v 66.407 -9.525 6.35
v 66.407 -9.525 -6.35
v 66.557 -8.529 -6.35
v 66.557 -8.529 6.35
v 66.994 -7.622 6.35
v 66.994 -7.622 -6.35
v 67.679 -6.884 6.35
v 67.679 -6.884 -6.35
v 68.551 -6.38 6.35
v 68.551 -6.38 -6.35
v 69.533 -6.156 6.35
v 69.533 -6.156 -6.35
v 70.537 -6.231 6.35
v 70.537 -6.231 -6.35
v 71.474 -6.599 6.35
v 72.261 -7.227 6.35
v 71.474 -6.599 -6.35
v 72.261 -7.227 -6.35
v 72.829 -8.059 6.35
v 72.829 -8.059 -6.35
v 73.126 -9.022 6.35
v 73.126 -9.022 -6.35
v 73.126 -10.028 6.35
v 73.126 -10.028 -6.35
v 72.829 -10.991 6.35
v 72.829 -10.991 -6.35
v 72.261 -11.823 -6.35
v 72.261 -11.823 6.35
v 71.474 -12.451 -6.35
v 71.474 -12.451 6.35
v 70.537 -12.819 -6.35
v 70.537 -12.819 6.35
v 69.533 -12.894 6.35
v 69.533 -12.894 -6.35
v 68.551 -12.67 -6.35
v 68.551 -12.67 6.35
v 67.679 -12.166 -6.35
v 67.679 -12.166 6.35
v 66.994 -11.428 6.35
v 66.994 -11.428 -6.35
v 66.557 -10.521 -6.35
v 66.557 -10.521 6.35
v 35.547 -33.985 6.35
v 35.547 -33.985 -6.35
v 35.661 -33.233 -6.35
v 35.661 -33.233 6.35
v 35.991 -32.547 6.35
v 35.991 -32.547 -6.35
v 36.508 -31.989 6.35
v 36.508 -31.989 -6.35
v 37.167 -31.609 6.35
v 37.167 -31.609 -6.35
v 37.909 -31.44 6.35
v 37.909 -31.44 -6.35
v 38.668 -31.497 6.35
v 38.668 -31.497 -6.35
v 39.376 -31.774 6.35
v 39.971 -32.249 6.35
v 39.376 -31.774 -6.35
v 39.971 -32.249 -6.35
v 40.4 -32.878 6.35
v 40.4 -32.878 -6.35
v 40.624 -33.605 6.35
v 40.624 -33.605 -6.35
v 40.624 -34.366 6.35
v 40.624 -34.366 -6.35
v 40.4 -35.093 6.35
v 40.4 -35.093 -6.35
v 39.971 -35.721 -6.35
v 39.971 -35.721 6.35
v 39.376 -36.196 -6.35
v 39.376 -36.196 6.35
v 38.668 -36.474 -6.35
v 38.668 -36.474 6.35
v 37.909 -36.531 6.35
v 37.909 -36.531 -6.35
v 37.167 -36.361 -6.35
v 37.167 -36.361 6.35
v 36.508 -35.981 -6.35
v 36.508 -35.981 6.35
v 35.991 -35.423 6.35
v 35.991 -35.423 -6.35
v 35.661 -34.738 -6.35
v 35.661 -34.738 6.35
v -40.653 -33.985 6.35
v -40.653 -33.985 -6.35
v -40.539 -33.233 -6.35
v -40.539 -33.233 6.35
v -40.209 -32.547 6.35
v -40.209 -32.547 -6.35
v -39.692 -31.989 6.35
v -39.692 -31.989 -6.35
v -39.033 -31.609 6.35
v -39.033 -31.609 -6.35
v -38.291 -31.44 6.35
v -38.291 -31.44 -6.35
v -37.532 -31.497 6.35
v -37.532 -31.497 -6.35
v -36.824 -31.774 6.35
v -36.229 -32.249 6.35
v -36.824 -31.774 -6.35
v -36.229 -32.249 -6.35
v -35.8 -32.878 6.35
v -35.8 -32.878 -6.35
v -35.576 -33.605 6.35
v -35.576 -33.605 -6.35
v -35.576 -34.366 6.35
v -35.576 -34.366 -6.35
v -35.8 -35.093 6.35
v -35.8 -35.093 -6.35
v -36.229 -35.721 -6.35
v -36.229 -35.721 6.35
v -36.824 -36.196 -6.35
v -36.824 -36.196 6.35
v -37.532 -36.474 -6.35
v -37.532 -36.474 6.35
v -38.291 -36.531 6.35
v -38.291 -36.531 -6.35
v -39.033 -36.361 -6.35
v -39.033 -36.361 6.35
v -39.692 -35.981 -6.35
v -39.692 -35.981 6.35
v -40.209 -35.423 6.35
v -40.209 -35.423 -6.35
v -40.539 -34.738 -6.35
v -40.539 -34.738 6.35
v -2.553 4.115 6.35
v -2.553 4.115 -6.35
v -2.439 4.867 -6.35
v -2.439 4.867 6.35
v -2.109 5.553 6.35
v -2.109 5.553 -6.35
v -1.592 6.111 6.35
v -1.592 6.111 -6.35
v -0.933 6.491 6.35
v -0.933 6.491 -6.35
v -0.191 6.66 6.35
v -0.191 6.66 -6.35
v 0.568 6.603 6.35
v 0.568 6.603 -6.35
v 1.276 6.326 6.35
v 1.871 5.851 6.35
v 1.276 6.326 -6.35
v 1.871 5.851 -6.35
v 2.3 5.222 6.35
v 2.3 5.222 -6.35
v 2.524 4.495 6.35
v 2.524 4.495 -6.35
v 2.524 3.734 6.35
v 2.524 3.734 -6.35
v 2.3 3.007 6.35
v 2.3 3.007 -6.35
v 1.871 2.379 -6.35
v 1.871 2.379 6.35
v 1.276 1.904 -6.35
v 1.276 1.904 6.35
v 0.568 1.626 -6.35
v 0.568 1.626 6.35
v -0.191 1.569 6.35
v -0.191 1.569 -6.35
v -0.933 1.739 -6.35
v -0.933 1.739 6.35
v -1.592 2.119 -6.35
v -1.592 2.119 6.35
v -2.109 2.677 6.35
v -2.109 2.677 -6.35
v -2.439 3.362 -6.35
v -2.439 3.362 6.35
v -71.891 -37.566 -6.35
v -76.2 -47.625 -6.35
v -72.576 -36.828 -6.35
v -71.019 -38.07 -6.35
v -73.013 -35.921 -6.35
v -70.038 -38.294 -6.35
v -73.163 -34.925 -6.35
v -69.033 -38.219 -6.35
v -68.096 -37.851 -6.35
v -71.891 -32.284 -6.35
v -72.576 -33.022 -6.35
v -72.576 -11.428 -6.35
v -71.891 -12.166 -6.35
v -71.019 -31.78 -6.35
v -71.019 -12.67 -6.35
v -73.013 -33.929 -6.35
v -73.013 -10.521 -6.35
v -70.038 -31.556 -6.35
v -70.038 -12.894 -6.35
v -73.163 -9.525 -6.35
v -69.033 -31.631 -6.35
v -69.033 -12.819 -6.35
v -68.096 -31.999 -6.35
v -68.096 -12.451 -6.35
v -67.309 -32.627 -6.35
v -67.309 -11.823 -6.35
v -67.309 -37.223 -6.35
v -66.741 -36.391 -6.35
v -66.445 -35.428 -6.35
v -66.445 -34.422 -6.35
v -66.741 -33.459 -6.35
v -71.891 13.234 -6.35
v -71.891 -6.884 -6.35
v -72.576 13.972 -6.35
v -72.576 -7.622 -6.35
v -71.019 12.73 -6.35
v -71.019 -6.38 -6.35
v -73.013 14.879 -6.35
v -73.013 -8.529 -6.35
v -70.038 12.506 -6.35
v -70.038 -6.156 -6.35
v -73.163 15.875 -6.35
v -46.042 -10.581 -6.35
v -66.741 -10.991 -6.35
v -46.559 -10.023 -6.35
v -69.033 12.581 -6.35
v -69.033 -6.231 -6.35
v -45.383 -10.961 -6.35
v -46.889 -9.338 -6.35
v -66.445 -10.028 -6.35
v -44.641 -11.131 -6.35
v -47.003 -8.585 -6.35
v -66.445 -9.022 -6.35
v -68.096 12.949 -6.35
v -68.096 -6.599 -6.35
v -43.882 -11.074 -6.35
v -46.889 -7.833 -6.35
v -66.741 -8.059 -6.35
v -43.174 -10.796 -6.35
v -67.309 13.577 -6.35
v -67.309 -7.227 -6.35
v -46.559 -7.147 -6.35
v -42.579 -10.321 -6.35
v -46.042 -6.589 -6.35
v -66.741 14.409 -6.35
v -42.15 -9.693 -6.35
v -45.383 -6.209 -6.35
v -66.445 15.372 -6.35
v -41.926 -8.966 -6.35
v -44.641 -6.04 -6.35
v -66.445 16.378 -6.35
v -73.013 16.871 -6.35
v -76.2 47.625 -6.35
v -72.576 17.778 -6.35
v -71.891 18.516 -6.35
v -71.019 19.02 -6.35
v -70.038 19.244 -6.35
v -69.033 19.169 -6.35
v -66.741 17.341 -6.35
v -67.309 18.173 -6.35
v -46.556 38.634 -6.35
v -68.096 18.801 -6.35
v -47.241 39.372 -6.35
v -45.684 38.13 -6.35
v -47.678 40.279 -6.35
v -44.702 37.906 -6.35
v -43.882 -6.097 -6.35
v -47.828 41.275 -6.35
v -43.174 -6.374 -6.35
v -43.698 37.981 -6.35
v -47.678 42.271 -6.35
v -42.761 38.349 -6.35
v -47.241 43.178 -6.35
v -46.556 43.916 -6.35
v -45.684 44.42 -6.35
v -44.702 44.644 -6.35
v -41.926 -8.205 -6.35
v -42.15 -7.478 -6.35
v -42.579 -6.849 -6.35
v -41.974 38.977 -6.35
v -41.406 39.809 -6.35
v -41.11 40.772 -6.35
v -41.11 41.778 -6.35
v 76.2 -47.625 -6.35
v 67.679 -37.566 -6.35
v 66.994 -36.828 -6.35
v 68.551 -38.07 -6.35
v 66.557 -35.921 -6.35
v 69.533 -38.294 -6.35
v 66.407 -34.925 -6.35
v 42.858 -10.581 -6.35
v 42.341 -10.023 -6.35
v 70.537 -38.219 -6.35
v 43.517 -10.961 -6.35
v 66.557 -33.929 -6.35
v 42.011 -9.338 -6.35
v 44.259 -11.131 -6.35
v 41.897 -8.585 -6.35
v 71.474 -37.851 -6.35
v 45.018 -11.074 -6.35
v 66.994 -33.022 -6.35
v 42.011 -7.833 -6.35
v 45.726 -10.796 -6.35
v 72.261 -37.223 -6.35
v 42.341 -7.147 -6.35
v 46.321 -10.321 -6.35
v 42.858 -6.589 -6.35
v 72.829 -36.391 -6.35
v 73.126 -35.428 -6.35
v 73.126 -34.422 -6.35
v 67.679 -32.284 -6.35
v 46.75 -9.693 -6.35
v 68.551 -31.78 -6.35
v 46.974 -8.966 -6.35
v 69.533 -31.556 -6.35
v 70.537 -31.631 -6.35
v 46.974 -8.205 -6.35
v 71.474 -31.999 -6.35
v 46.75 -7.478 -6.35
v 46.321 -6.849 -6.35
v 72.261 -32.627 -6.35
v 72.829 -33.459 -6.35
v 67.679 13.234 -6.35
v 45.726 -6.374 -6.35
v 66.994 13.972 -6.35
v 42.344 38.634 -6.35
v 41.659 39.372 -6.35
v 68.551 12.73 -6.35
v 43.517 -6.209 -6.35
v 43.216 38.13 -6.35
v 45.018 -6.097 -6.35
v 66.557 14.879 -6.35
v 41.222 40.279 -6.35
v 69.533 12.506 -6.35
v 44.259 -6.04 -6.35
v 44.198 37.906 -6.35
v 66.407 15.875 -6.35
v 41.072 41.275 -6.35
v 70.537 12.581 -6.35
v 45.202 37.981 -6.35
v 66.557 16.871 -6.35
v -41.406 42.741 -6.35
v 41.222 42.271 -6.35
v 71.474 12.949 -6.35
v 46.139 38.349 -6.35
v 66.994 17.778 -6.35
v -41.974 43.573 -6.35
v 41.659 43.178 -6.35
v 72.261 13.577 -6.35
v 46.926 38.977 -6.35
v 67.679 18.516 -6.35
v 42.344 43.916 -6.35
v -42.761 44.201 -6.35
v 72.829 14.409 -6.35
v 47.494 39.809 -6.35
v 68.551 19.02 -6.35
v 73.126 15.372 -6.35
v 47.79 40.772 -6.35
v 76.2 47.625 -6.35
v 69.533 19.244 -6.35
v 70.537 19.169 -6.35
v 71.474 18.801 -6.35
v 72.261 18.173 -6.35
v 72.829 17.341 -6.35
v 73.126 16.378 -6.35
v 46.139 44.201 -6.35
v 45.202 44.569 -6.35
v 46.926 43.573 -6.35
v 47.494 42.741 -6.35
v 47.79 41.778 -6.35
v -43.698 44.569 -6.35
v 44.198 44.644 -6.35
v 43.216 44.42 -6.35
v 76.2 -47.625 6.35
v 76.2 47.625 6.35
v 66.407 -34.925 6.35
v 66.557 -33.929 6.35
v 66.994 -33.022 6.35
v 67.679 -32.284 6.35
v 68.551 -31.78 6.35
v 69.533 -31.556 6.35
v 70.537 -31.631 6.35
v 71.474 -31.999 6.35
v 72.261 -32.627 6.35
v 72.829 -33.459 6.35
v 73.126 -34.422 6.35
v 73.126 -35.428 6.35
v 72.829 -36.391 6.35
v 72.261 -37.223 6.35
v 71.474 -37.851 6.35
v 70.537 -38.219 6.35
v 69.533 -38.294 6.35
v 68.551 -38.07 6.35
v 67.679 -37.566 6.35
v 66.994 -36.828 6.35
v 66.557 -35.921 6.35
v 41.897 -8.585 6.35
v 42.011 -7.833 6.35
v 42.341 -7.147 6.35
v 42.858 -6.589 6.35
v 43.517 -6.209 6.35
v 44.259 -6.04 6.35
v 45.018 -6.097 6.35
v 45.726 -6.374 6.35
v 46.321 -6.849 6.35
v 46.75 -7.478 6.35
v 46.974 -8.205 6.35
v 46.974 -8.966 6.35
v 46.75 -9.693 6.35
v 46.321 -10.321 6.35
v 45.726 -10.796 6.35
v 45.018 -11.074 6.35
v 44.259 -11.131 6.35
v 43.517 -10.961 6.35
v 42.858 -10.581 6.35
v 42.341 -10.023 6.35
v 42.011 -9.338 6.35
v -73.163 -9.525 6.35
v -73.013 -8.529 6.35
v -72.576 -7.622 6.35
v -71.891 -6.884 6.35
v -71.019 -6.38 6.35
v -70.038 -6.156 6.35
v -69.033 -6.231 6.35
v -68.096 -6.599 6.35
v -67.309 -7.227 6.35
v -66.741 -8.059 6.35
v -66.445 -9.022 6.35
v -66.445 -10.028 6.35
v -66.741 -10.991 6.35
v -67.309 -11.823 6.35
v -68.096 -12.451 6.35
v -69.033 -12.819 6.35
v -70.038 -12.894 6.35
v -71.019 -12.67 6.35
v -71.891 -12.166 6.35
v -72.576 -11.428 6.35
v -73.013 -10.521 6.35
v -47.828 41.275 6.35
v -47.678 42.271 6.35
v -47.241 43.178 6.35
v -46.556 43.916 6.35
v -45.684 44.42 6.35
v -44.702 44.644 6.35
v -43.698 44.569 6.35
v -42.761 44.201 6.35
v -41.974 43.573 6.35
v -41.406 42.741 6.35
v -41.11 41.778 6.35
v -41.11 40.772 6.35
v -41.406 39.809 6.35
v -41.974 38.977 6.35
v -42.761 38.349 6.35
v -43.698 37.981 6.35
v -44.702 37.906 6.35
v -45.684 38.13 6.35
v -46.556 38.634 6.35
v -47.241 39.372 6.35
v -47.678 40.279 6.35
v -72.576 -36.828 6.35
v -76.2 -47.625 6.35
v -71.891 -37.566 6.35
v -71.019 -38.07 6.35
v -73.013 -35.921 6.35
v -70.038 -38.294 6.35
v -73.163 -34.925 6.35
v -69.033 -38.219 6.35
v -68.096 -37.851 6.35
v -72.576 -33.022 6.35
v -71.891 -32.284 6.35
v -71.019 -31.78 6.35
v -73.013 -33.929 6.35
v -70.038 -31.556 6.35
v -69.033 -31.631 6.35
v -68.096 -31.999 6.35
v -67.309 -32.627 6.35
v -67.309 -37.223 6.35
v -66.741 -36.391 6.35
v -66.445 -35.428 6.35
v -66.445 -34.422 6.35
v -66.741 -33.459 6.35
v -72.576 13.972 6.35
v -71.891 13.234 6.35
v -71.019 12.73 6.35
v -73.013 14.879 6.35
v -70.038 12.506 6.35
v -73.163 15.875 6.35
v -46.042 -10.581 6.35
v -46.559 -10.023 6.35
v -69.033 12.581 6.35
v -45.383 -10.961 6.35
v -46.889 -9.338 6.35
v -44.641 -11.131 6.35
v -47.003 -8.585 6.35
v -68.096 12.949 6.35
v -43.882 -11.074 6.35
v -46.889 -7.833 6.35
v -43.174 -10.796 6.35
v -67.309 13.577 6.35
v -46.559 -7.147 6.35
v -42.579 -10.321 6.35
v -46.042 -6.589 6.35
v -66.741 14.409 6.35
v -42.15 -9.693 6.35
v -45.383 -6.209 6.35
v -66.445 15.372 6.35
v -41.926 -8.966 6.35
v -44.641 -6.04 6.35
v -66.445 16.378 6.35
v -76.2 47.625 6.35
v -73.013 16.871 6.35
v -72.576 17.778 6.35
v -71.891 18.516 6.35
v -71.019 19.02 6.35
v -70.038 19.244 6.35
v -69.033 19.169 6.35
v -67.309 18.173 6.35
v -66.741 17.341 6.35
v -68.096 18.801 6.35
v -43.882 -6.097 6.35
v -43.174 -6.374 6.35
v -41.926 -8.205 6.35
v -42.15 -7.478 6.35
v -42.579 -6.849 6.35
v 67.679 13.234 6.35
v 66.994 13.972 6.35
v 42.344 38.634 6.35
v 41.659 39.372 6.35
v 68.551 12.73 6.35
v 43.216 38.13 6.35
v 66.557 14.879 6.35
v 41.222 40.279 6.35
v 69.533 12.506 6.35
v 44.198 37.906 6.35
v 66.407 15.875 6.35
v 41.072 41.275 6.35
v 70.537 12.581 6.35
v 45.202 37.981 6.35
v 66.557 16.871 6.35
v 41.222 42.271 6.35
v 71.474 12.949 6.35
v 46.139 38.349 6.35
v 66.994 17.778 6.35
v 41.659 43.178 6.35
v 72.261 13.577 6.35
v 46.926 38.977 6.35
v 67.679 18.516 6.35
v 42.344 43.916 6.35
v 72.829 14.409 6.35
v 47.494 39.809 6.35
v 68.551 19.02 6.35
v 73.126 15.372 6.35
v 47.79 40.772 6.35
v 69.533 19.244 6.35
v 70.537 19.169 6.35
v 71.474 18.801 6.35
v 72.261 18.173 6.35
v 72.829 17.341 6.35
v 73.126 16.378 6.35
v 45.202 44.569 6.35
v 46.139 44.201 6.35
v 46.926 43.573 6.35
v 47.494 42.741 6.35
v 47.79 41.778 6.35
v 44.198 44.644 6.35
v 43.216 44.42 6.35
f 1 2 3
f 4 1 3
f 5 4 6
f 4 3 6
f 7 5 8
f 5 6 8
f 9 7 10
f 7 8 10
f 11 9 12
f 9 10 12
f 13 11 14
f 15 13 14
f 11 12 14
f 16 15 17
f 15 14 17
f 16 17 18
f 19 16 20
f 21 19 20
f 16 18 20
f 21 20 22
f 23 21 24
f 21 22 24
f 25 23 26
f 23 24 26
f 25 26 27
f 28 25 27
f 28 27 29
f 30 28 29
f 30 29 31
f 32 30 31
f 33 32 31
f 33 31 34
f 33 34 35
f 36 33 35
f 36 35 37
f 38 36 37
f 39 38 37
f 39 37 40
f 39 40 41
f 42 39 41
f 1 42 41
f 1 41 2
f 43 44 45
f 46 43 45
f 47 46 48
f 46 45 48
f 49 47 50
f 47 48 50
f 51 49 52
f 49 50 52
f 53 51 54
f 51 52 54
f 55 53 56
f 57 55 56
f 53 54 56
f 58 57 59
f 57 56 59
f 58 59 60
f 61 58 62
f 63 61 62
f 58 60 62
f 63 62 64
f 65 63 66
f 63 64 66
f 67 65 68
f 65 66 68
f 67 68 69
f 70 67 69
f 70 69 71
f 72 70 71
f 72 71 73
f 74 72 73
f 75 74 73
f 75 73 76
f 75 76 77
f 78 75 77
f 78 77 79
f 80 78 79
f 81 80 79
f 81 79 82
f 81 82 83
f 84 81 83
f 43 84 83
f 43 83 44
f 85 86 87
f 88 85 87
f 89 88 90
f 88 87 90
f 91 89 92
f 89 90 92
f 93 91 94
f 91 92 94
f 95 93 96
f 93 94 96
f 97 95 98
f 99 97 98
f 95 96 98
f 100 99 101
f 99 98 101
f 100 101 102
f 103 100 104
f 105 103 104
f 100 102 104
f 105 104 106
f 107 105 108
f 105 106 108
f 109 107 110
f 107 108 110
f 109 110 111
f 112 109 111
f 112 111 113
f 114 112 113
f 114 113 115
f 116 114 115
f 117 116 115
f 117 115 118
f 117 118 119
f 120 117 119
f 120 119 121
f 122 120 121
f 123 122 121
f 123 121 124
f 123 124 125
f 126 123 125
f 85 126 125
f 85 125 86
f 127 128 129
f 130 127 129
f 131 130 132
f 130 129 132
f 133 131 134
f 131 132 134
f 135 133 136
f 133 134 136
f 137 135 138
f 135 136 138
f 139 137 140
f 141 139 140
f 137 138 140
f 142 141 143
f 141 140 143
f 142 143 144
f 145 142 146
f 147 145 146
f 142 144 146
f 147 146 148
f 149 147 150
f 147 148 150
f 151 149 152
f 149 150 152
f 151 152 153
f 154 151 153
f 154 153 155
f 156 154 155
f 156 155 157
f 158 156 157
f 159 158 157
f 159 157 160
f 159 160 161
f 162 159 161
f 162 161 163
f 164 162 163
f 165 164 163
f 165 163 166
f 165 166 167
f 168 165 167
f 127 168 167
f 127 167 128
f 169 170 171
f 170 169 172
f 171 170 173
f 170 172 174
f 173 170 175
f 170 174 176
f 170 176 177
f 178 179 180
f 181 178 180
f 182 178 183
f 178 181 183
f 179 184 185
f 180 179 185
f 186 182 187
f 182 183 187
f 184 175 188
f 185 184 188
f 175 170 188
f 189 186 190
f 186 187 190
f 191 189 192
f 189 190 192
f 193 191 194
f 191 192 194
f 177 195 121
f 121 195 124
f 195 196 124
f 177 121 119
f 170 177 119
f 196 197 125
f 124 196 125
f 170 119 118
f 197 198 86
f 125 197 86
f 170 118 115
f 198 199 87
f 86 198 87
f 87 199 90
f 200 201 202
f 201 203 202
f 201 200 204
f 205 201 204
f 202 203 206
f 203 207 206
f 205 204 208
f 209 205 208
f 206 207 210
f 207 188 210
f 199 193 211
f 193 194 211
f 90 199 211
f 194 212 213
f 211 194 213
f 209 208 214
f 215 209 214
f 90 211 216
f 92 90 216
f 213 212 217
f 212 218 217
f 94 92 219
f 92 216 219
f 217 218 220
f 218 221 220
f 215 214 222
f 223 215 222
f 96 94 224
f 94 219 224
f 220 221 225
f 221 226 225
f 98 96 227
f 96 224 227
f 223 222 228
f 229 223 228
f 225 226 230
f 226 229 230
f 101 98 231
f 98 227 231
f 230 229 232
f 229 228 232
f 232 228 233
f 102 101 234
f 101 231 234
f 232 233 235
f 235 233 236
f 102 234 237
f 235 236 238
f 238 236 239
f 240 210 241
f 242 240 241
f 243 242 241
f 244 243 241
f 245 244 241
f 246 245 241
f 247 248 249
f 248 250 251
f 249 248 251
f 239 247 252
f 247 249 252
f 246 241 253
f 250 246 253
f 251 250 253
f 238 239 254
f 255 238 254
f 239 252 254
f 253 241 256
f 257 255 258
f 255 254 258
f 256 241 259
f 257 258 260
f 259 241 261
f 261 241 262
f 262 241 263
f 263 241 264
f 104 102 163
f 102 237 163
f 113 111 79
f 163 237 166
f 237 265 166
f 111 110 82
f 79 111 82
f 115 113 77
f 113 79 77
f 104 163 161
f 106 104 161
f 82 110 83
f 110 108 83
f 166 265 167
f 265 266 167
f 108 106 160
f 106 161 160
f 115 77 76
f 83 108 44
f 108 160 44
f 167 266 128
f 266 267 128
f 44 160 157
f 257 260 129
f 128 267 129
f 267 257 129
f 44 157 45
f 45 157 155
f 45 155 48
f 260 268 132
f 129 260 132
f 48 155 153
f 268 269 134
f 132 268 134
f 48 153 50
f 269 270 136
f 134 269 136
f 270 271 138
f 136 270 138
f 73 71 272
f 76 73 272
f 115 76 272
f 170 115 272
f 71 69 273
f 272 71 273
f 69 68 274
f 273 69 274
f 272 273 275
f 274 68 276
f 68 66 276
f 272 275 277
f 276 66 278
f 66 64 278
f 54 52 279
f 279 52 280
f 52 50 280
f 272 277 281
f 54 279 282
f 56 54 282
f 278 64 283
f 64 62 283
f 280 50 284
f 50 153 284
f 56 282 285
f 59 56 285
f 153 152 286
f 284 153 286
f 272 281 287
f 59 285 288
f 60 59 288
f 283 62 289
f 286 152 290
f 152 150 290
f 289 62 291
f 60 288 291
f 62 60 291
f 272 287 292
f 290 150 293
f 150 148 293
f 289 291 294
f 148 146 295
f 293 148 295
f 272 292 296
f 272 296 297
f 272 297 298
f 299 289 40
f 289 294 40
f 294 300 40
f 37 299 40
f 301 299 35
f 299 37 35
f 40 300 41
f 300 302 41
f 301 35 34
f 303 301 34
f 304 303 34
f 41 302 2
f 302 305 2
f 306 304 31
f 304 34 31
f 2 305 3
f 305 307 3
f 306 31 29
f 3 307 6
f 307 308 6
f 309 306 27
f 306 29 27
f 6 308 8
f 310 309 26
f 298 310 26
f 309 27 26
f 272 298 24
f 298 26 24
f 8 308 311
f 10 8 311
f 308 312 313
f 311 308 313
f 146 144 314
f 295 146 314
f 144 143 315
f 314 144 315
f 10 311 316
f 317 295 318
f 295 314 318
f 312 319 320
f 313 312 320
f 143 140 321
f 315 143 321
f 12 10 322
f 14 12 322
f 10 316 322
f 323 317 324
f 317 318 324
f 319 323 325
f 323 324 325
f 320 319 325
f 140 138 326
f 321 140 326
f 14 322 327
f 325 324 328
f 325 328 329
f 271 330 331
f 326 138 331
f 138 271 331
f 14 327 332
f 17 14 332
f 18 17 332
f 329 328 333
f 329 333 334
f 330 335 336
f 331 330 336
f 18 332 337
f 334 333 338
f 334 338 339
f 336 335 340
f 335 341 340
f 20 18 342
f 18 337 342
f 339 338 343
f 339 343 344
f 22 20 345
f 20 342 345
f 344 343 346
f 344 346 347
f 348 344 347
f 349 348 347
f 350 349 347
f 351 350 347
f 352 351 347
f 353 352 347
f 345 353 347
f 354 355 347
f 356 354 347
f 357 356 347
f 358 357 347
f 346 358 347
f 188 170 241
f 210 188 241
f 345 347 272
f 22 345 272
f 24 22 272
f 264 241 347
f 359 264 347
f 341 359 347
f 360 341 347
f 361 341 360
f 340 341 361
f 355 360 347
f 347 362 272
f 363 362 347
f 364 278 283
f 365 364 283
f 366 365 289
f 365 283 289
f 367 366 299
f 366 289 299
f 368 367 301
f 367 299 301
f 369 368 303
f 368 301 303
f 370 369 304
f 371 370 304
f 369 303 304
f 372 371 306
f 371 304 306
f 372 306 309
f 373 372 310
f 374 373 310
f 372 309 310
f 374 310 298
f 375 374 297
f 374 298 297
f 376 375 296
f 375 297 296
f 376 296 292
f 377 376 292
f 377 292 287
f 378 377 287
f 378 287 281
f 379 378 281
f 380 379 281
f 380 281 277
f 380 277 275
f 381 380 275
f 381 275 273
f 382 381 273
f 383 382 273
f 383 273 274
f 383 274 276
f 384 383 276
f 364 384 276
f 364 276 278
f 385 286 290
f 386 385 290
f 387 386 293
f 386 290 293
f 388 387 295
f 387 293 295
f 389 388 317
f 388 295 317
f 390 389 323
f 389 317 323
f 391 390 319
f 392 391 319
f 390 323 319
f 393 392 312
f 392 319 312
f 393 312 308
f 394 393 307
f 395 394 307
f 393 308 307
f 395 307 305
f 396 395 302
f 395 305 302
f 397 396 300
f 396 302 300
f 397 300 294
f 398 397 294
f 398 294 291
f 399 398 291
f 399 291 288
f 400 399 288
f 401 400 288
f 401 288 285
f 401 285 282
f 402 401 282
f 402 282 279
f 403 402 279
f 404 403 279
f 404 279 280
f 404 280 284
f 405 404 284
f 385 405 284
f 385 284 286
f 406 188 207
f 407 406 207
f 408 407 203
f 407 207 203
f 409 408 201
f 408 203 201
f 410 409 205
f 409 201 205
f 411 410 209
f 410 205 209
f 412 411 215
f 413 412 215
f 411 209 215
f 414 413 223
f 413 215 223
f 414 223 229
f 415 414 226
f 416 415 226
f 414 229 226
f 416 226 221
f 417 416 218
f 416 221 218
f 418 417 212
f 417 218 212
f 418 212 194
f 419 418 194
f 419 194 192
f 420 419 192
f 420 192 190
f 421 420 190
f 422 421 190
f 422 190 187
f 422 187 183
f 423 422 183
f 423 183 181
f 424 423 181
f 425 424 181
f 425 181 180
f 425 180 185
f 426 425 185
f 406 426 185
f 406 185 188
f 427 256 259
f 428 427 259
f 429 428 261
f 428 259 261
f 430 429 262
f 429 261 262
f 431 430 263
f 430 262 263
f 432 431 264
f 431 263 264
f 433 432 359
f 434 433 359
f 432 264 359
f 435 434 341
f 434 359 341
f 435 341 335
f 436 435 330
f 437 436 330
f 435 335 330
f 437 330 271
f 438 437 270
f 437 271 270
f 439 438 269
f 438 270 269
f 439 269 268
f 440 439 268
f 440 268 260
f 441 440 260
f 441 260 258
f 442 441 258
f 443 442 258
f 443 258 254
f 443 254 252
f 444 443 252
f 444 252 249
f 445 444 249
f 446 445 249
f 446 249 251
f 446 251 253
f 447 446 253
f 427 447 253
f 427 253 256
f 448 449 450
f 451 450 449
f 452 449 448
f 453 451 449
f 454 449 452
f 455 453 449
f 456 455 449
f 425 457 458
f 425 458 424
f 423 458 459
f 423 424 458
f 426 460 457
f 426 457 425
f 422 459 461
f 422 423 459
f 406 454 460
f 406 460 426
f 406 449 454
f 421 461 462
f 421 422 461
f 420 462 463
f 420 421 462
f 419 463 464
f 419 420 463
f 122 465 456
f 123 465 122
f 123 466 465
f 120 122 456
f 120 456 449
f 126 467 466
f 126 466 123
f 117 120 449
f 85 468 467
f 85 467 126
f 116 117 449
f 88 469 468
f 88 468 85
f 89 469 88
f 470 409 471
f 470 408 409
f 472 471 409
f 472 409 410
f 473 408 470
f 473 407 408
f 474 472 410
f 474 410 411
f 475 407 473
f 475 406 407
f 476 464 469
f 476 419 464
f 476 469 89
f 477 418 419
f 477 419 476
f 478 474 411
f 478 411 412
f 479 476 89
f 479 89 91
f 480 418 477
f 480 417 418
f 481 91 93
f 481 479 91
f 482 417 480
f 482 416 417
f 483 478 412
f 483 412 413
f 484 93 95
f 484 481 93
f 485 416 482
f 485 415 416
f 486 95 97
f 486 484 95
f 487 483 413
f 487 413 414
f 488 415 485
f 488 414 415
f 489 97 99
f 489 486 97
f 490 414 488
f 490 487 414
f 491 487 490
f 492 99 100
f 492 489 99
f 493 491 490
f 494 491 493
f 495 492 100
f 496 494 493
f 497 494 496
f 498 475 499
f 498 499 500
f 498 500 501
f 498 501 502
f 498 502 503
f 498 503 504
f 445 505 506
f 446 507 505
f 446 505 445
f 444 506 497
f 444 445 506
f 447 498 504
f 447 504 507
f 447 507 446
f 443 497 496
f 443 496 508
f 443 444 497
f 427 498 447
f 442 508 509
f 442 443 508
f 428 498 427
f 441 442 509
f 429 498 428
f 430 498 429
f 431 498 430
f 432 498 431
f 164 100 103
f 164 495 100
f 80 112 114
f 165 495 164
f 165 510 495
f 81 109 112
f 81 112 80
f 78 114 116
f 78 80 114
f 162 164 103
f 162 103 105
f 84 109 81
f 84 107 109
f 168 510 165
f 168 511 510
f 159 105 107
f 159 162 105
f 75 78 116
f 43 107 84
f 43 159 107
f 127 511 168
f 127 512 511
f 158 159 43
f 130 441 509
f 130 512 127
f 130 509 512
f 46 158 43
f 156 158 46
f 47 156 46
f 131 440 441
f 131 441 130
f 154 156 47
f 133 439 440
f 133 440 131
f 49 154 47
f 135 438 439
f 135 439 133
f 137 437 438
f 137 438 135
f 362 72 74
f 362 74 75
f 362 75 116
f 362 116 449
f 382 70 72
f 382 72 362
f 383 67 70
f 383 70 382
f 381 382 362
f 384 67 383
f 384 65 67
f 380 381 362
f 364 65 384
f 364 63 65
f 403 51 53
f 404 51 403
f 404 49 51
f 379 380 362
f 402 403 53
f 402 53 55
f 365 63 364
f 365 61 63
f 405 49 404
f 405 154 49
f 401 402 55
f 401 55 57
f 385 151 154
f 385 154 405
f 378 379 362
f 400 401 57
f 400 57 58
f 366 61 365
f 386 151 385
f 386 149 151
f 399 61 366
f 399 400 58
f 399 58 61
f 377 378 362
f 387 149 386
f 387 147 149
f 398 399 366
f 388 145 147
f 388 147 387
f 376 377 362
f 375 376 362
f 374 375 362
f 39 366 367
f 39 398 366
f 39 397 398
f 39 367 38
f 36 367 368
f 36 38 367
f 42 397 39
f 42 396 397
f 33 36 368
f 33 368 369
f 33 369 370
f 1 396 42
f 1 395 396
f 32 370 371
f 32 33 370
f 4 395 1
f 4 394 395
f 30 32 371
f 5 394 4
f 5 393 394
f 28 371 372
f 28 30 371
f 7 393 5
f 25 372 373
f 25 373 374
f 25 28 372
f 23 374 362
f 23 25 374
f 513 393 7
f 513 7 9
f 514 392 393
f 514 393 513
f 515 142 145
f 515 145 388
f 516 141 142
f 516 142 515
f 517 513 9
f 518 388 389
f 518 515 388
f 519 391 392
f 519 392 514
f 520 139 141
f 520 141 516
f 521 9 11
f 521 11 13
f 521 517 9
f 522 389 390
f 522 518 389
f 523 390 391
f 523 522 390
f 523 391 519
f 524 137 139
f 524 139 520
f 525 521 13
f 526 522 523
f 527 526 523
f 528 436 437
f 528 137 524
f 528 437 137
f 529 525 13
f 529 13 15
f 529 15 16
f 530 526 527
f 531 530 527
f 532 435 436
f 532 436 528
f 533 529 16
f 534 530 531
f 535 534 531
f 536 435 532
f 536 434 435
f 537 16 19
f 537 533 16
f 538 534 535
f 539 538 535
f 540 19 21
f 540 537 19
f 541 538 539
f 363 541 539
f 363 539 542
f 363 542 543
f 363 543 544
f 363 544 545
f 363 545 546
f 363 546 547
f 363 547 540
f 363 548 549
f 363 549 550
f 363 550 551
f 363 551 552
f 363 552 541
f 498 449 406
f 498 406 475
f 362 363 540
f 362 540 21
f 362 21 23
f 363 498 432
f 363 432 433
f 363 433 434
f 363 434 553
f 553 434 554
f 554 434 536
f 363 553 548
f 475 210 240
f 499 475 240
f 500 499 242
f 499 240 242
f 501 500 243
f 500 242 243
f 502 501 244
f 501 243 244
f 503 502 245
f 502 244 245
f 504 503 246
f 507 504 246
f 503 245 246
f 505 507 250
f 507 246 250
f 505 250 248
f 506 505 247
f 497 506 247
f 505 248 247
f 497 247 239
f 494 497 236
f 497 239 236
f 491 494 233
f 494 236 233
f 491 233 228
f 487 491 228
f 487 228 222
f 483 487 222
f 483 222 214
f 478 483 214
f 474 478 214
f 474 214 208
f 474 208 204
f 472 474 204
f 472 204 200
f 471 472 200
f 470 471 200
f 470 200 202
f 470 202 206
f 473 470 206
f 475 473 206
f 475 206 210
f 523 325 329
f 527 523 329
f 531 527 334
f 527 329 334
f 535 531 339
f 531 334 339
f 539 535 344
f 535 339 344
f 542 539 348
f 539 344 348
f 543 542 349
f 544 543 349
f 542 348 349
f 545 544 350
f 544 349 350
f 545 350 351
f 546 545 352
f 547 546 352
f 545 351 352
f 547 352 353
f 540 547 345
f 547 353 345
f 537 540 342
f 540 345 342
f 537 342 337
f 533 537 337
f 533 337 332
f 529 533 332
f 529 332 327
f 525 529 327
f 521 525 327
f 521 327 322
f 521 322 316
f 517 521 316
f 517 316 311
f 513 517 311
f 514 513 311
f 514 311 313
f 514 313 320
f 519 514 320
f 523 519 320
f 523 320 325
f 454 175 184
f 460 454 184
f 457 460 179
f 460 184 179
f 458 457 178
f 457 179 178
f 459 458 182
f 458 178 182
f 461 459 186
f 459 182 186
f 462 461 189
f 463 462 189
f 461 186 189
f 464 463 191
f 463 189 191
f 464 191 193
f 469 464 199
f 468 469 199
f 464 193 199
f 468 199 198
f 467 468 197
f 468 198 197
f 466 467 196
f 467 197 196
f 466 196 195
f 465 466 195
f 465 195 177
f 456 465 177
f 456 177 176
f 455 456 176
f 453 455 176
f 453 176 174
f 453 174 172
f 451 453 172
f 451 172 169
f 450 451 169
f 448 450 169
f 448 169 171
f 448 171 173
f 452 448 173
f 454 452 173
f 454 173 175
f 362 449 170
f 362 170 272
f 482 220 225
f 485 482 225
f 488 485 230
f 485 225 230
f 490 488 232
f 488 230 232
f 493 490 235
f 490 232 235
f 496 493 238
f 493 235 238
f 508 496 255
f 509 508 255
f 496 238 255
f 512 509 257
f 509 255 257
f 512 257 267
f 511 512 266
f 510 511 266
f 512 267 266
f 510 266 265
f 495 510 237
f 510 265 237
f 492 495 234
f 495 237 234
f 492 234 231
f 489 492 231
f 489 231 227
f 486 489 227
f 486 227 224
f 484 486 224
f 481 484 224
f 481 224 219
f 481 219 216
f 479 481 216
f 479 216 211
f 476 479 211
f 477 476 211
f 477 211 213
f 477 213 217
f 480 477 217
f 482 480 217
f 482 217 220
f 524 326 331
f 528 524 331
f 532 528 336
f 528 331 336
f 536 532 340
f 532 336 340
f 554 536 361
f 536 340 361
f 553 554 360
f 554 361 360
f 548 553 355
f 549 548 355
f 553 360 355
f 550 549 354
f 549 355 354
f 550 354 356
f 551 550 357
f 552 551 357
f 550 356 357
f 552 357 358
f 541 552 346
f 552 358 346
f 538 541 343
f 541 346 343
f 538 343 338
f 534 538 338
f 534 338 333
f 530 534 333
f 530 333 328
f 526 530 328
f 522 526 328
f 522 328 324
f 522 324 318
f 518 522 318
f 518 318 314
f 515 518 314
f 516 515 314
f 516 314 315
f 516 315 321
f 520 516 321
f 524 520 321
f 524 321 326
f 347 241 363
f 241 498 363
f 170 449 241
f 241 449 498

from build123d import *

# Parameters (mm, degrees)
SKETCH1_W                   = 152.4
SKETCH1_H                   = 95.25
BOSS_EXTRUDE1_DEPTH         = 6.35
F_1_4_CLEARANCE_HOLE1_D     = 6.7564
TAP_DRILL_FOR_1_4_20_TAP1_D = 5.1054


with BuildPart() as part:
    # Sketch1 → Boss-Extrude1 (new, symmetric)
    with BuildSketch(Plane.XY):
        Rectangle(SKETCH1_W, SKETCH1_H)
    extrude(amount=BOSS_EXTRUDE1_DEPTH, both=True)

    # 1/4 Clearance Hole1 (through all)
    with Locations(Plane.XY.offset(6.35)):
        with Locations((-44.45, 41.275), (44.45, 41.275), (69.785060268, 15.875), (69.785060268, -9.525), (69.785060268, -34.925), (-69.785060268, 15.875), (-69.785060268, -9.525), (-69.785060268, -34.925)):
            Hole(F_1_4_CLEARANCE_HOLE1_D / 2)

    # Tap Drill for 1/4-20 Tap1 (through all)
    with Locations(Plane.XY.offset(6.35)):
        with Locations((-38.1, -33.9852), (38.1, -33.9852), (-44.45, -8.5852), (44.45, -8.5852), (0, 4.1148)):
            Hole(TAP_DRILL_FOR_1_4_20_TAP1_D / 2)


solid = part.part
